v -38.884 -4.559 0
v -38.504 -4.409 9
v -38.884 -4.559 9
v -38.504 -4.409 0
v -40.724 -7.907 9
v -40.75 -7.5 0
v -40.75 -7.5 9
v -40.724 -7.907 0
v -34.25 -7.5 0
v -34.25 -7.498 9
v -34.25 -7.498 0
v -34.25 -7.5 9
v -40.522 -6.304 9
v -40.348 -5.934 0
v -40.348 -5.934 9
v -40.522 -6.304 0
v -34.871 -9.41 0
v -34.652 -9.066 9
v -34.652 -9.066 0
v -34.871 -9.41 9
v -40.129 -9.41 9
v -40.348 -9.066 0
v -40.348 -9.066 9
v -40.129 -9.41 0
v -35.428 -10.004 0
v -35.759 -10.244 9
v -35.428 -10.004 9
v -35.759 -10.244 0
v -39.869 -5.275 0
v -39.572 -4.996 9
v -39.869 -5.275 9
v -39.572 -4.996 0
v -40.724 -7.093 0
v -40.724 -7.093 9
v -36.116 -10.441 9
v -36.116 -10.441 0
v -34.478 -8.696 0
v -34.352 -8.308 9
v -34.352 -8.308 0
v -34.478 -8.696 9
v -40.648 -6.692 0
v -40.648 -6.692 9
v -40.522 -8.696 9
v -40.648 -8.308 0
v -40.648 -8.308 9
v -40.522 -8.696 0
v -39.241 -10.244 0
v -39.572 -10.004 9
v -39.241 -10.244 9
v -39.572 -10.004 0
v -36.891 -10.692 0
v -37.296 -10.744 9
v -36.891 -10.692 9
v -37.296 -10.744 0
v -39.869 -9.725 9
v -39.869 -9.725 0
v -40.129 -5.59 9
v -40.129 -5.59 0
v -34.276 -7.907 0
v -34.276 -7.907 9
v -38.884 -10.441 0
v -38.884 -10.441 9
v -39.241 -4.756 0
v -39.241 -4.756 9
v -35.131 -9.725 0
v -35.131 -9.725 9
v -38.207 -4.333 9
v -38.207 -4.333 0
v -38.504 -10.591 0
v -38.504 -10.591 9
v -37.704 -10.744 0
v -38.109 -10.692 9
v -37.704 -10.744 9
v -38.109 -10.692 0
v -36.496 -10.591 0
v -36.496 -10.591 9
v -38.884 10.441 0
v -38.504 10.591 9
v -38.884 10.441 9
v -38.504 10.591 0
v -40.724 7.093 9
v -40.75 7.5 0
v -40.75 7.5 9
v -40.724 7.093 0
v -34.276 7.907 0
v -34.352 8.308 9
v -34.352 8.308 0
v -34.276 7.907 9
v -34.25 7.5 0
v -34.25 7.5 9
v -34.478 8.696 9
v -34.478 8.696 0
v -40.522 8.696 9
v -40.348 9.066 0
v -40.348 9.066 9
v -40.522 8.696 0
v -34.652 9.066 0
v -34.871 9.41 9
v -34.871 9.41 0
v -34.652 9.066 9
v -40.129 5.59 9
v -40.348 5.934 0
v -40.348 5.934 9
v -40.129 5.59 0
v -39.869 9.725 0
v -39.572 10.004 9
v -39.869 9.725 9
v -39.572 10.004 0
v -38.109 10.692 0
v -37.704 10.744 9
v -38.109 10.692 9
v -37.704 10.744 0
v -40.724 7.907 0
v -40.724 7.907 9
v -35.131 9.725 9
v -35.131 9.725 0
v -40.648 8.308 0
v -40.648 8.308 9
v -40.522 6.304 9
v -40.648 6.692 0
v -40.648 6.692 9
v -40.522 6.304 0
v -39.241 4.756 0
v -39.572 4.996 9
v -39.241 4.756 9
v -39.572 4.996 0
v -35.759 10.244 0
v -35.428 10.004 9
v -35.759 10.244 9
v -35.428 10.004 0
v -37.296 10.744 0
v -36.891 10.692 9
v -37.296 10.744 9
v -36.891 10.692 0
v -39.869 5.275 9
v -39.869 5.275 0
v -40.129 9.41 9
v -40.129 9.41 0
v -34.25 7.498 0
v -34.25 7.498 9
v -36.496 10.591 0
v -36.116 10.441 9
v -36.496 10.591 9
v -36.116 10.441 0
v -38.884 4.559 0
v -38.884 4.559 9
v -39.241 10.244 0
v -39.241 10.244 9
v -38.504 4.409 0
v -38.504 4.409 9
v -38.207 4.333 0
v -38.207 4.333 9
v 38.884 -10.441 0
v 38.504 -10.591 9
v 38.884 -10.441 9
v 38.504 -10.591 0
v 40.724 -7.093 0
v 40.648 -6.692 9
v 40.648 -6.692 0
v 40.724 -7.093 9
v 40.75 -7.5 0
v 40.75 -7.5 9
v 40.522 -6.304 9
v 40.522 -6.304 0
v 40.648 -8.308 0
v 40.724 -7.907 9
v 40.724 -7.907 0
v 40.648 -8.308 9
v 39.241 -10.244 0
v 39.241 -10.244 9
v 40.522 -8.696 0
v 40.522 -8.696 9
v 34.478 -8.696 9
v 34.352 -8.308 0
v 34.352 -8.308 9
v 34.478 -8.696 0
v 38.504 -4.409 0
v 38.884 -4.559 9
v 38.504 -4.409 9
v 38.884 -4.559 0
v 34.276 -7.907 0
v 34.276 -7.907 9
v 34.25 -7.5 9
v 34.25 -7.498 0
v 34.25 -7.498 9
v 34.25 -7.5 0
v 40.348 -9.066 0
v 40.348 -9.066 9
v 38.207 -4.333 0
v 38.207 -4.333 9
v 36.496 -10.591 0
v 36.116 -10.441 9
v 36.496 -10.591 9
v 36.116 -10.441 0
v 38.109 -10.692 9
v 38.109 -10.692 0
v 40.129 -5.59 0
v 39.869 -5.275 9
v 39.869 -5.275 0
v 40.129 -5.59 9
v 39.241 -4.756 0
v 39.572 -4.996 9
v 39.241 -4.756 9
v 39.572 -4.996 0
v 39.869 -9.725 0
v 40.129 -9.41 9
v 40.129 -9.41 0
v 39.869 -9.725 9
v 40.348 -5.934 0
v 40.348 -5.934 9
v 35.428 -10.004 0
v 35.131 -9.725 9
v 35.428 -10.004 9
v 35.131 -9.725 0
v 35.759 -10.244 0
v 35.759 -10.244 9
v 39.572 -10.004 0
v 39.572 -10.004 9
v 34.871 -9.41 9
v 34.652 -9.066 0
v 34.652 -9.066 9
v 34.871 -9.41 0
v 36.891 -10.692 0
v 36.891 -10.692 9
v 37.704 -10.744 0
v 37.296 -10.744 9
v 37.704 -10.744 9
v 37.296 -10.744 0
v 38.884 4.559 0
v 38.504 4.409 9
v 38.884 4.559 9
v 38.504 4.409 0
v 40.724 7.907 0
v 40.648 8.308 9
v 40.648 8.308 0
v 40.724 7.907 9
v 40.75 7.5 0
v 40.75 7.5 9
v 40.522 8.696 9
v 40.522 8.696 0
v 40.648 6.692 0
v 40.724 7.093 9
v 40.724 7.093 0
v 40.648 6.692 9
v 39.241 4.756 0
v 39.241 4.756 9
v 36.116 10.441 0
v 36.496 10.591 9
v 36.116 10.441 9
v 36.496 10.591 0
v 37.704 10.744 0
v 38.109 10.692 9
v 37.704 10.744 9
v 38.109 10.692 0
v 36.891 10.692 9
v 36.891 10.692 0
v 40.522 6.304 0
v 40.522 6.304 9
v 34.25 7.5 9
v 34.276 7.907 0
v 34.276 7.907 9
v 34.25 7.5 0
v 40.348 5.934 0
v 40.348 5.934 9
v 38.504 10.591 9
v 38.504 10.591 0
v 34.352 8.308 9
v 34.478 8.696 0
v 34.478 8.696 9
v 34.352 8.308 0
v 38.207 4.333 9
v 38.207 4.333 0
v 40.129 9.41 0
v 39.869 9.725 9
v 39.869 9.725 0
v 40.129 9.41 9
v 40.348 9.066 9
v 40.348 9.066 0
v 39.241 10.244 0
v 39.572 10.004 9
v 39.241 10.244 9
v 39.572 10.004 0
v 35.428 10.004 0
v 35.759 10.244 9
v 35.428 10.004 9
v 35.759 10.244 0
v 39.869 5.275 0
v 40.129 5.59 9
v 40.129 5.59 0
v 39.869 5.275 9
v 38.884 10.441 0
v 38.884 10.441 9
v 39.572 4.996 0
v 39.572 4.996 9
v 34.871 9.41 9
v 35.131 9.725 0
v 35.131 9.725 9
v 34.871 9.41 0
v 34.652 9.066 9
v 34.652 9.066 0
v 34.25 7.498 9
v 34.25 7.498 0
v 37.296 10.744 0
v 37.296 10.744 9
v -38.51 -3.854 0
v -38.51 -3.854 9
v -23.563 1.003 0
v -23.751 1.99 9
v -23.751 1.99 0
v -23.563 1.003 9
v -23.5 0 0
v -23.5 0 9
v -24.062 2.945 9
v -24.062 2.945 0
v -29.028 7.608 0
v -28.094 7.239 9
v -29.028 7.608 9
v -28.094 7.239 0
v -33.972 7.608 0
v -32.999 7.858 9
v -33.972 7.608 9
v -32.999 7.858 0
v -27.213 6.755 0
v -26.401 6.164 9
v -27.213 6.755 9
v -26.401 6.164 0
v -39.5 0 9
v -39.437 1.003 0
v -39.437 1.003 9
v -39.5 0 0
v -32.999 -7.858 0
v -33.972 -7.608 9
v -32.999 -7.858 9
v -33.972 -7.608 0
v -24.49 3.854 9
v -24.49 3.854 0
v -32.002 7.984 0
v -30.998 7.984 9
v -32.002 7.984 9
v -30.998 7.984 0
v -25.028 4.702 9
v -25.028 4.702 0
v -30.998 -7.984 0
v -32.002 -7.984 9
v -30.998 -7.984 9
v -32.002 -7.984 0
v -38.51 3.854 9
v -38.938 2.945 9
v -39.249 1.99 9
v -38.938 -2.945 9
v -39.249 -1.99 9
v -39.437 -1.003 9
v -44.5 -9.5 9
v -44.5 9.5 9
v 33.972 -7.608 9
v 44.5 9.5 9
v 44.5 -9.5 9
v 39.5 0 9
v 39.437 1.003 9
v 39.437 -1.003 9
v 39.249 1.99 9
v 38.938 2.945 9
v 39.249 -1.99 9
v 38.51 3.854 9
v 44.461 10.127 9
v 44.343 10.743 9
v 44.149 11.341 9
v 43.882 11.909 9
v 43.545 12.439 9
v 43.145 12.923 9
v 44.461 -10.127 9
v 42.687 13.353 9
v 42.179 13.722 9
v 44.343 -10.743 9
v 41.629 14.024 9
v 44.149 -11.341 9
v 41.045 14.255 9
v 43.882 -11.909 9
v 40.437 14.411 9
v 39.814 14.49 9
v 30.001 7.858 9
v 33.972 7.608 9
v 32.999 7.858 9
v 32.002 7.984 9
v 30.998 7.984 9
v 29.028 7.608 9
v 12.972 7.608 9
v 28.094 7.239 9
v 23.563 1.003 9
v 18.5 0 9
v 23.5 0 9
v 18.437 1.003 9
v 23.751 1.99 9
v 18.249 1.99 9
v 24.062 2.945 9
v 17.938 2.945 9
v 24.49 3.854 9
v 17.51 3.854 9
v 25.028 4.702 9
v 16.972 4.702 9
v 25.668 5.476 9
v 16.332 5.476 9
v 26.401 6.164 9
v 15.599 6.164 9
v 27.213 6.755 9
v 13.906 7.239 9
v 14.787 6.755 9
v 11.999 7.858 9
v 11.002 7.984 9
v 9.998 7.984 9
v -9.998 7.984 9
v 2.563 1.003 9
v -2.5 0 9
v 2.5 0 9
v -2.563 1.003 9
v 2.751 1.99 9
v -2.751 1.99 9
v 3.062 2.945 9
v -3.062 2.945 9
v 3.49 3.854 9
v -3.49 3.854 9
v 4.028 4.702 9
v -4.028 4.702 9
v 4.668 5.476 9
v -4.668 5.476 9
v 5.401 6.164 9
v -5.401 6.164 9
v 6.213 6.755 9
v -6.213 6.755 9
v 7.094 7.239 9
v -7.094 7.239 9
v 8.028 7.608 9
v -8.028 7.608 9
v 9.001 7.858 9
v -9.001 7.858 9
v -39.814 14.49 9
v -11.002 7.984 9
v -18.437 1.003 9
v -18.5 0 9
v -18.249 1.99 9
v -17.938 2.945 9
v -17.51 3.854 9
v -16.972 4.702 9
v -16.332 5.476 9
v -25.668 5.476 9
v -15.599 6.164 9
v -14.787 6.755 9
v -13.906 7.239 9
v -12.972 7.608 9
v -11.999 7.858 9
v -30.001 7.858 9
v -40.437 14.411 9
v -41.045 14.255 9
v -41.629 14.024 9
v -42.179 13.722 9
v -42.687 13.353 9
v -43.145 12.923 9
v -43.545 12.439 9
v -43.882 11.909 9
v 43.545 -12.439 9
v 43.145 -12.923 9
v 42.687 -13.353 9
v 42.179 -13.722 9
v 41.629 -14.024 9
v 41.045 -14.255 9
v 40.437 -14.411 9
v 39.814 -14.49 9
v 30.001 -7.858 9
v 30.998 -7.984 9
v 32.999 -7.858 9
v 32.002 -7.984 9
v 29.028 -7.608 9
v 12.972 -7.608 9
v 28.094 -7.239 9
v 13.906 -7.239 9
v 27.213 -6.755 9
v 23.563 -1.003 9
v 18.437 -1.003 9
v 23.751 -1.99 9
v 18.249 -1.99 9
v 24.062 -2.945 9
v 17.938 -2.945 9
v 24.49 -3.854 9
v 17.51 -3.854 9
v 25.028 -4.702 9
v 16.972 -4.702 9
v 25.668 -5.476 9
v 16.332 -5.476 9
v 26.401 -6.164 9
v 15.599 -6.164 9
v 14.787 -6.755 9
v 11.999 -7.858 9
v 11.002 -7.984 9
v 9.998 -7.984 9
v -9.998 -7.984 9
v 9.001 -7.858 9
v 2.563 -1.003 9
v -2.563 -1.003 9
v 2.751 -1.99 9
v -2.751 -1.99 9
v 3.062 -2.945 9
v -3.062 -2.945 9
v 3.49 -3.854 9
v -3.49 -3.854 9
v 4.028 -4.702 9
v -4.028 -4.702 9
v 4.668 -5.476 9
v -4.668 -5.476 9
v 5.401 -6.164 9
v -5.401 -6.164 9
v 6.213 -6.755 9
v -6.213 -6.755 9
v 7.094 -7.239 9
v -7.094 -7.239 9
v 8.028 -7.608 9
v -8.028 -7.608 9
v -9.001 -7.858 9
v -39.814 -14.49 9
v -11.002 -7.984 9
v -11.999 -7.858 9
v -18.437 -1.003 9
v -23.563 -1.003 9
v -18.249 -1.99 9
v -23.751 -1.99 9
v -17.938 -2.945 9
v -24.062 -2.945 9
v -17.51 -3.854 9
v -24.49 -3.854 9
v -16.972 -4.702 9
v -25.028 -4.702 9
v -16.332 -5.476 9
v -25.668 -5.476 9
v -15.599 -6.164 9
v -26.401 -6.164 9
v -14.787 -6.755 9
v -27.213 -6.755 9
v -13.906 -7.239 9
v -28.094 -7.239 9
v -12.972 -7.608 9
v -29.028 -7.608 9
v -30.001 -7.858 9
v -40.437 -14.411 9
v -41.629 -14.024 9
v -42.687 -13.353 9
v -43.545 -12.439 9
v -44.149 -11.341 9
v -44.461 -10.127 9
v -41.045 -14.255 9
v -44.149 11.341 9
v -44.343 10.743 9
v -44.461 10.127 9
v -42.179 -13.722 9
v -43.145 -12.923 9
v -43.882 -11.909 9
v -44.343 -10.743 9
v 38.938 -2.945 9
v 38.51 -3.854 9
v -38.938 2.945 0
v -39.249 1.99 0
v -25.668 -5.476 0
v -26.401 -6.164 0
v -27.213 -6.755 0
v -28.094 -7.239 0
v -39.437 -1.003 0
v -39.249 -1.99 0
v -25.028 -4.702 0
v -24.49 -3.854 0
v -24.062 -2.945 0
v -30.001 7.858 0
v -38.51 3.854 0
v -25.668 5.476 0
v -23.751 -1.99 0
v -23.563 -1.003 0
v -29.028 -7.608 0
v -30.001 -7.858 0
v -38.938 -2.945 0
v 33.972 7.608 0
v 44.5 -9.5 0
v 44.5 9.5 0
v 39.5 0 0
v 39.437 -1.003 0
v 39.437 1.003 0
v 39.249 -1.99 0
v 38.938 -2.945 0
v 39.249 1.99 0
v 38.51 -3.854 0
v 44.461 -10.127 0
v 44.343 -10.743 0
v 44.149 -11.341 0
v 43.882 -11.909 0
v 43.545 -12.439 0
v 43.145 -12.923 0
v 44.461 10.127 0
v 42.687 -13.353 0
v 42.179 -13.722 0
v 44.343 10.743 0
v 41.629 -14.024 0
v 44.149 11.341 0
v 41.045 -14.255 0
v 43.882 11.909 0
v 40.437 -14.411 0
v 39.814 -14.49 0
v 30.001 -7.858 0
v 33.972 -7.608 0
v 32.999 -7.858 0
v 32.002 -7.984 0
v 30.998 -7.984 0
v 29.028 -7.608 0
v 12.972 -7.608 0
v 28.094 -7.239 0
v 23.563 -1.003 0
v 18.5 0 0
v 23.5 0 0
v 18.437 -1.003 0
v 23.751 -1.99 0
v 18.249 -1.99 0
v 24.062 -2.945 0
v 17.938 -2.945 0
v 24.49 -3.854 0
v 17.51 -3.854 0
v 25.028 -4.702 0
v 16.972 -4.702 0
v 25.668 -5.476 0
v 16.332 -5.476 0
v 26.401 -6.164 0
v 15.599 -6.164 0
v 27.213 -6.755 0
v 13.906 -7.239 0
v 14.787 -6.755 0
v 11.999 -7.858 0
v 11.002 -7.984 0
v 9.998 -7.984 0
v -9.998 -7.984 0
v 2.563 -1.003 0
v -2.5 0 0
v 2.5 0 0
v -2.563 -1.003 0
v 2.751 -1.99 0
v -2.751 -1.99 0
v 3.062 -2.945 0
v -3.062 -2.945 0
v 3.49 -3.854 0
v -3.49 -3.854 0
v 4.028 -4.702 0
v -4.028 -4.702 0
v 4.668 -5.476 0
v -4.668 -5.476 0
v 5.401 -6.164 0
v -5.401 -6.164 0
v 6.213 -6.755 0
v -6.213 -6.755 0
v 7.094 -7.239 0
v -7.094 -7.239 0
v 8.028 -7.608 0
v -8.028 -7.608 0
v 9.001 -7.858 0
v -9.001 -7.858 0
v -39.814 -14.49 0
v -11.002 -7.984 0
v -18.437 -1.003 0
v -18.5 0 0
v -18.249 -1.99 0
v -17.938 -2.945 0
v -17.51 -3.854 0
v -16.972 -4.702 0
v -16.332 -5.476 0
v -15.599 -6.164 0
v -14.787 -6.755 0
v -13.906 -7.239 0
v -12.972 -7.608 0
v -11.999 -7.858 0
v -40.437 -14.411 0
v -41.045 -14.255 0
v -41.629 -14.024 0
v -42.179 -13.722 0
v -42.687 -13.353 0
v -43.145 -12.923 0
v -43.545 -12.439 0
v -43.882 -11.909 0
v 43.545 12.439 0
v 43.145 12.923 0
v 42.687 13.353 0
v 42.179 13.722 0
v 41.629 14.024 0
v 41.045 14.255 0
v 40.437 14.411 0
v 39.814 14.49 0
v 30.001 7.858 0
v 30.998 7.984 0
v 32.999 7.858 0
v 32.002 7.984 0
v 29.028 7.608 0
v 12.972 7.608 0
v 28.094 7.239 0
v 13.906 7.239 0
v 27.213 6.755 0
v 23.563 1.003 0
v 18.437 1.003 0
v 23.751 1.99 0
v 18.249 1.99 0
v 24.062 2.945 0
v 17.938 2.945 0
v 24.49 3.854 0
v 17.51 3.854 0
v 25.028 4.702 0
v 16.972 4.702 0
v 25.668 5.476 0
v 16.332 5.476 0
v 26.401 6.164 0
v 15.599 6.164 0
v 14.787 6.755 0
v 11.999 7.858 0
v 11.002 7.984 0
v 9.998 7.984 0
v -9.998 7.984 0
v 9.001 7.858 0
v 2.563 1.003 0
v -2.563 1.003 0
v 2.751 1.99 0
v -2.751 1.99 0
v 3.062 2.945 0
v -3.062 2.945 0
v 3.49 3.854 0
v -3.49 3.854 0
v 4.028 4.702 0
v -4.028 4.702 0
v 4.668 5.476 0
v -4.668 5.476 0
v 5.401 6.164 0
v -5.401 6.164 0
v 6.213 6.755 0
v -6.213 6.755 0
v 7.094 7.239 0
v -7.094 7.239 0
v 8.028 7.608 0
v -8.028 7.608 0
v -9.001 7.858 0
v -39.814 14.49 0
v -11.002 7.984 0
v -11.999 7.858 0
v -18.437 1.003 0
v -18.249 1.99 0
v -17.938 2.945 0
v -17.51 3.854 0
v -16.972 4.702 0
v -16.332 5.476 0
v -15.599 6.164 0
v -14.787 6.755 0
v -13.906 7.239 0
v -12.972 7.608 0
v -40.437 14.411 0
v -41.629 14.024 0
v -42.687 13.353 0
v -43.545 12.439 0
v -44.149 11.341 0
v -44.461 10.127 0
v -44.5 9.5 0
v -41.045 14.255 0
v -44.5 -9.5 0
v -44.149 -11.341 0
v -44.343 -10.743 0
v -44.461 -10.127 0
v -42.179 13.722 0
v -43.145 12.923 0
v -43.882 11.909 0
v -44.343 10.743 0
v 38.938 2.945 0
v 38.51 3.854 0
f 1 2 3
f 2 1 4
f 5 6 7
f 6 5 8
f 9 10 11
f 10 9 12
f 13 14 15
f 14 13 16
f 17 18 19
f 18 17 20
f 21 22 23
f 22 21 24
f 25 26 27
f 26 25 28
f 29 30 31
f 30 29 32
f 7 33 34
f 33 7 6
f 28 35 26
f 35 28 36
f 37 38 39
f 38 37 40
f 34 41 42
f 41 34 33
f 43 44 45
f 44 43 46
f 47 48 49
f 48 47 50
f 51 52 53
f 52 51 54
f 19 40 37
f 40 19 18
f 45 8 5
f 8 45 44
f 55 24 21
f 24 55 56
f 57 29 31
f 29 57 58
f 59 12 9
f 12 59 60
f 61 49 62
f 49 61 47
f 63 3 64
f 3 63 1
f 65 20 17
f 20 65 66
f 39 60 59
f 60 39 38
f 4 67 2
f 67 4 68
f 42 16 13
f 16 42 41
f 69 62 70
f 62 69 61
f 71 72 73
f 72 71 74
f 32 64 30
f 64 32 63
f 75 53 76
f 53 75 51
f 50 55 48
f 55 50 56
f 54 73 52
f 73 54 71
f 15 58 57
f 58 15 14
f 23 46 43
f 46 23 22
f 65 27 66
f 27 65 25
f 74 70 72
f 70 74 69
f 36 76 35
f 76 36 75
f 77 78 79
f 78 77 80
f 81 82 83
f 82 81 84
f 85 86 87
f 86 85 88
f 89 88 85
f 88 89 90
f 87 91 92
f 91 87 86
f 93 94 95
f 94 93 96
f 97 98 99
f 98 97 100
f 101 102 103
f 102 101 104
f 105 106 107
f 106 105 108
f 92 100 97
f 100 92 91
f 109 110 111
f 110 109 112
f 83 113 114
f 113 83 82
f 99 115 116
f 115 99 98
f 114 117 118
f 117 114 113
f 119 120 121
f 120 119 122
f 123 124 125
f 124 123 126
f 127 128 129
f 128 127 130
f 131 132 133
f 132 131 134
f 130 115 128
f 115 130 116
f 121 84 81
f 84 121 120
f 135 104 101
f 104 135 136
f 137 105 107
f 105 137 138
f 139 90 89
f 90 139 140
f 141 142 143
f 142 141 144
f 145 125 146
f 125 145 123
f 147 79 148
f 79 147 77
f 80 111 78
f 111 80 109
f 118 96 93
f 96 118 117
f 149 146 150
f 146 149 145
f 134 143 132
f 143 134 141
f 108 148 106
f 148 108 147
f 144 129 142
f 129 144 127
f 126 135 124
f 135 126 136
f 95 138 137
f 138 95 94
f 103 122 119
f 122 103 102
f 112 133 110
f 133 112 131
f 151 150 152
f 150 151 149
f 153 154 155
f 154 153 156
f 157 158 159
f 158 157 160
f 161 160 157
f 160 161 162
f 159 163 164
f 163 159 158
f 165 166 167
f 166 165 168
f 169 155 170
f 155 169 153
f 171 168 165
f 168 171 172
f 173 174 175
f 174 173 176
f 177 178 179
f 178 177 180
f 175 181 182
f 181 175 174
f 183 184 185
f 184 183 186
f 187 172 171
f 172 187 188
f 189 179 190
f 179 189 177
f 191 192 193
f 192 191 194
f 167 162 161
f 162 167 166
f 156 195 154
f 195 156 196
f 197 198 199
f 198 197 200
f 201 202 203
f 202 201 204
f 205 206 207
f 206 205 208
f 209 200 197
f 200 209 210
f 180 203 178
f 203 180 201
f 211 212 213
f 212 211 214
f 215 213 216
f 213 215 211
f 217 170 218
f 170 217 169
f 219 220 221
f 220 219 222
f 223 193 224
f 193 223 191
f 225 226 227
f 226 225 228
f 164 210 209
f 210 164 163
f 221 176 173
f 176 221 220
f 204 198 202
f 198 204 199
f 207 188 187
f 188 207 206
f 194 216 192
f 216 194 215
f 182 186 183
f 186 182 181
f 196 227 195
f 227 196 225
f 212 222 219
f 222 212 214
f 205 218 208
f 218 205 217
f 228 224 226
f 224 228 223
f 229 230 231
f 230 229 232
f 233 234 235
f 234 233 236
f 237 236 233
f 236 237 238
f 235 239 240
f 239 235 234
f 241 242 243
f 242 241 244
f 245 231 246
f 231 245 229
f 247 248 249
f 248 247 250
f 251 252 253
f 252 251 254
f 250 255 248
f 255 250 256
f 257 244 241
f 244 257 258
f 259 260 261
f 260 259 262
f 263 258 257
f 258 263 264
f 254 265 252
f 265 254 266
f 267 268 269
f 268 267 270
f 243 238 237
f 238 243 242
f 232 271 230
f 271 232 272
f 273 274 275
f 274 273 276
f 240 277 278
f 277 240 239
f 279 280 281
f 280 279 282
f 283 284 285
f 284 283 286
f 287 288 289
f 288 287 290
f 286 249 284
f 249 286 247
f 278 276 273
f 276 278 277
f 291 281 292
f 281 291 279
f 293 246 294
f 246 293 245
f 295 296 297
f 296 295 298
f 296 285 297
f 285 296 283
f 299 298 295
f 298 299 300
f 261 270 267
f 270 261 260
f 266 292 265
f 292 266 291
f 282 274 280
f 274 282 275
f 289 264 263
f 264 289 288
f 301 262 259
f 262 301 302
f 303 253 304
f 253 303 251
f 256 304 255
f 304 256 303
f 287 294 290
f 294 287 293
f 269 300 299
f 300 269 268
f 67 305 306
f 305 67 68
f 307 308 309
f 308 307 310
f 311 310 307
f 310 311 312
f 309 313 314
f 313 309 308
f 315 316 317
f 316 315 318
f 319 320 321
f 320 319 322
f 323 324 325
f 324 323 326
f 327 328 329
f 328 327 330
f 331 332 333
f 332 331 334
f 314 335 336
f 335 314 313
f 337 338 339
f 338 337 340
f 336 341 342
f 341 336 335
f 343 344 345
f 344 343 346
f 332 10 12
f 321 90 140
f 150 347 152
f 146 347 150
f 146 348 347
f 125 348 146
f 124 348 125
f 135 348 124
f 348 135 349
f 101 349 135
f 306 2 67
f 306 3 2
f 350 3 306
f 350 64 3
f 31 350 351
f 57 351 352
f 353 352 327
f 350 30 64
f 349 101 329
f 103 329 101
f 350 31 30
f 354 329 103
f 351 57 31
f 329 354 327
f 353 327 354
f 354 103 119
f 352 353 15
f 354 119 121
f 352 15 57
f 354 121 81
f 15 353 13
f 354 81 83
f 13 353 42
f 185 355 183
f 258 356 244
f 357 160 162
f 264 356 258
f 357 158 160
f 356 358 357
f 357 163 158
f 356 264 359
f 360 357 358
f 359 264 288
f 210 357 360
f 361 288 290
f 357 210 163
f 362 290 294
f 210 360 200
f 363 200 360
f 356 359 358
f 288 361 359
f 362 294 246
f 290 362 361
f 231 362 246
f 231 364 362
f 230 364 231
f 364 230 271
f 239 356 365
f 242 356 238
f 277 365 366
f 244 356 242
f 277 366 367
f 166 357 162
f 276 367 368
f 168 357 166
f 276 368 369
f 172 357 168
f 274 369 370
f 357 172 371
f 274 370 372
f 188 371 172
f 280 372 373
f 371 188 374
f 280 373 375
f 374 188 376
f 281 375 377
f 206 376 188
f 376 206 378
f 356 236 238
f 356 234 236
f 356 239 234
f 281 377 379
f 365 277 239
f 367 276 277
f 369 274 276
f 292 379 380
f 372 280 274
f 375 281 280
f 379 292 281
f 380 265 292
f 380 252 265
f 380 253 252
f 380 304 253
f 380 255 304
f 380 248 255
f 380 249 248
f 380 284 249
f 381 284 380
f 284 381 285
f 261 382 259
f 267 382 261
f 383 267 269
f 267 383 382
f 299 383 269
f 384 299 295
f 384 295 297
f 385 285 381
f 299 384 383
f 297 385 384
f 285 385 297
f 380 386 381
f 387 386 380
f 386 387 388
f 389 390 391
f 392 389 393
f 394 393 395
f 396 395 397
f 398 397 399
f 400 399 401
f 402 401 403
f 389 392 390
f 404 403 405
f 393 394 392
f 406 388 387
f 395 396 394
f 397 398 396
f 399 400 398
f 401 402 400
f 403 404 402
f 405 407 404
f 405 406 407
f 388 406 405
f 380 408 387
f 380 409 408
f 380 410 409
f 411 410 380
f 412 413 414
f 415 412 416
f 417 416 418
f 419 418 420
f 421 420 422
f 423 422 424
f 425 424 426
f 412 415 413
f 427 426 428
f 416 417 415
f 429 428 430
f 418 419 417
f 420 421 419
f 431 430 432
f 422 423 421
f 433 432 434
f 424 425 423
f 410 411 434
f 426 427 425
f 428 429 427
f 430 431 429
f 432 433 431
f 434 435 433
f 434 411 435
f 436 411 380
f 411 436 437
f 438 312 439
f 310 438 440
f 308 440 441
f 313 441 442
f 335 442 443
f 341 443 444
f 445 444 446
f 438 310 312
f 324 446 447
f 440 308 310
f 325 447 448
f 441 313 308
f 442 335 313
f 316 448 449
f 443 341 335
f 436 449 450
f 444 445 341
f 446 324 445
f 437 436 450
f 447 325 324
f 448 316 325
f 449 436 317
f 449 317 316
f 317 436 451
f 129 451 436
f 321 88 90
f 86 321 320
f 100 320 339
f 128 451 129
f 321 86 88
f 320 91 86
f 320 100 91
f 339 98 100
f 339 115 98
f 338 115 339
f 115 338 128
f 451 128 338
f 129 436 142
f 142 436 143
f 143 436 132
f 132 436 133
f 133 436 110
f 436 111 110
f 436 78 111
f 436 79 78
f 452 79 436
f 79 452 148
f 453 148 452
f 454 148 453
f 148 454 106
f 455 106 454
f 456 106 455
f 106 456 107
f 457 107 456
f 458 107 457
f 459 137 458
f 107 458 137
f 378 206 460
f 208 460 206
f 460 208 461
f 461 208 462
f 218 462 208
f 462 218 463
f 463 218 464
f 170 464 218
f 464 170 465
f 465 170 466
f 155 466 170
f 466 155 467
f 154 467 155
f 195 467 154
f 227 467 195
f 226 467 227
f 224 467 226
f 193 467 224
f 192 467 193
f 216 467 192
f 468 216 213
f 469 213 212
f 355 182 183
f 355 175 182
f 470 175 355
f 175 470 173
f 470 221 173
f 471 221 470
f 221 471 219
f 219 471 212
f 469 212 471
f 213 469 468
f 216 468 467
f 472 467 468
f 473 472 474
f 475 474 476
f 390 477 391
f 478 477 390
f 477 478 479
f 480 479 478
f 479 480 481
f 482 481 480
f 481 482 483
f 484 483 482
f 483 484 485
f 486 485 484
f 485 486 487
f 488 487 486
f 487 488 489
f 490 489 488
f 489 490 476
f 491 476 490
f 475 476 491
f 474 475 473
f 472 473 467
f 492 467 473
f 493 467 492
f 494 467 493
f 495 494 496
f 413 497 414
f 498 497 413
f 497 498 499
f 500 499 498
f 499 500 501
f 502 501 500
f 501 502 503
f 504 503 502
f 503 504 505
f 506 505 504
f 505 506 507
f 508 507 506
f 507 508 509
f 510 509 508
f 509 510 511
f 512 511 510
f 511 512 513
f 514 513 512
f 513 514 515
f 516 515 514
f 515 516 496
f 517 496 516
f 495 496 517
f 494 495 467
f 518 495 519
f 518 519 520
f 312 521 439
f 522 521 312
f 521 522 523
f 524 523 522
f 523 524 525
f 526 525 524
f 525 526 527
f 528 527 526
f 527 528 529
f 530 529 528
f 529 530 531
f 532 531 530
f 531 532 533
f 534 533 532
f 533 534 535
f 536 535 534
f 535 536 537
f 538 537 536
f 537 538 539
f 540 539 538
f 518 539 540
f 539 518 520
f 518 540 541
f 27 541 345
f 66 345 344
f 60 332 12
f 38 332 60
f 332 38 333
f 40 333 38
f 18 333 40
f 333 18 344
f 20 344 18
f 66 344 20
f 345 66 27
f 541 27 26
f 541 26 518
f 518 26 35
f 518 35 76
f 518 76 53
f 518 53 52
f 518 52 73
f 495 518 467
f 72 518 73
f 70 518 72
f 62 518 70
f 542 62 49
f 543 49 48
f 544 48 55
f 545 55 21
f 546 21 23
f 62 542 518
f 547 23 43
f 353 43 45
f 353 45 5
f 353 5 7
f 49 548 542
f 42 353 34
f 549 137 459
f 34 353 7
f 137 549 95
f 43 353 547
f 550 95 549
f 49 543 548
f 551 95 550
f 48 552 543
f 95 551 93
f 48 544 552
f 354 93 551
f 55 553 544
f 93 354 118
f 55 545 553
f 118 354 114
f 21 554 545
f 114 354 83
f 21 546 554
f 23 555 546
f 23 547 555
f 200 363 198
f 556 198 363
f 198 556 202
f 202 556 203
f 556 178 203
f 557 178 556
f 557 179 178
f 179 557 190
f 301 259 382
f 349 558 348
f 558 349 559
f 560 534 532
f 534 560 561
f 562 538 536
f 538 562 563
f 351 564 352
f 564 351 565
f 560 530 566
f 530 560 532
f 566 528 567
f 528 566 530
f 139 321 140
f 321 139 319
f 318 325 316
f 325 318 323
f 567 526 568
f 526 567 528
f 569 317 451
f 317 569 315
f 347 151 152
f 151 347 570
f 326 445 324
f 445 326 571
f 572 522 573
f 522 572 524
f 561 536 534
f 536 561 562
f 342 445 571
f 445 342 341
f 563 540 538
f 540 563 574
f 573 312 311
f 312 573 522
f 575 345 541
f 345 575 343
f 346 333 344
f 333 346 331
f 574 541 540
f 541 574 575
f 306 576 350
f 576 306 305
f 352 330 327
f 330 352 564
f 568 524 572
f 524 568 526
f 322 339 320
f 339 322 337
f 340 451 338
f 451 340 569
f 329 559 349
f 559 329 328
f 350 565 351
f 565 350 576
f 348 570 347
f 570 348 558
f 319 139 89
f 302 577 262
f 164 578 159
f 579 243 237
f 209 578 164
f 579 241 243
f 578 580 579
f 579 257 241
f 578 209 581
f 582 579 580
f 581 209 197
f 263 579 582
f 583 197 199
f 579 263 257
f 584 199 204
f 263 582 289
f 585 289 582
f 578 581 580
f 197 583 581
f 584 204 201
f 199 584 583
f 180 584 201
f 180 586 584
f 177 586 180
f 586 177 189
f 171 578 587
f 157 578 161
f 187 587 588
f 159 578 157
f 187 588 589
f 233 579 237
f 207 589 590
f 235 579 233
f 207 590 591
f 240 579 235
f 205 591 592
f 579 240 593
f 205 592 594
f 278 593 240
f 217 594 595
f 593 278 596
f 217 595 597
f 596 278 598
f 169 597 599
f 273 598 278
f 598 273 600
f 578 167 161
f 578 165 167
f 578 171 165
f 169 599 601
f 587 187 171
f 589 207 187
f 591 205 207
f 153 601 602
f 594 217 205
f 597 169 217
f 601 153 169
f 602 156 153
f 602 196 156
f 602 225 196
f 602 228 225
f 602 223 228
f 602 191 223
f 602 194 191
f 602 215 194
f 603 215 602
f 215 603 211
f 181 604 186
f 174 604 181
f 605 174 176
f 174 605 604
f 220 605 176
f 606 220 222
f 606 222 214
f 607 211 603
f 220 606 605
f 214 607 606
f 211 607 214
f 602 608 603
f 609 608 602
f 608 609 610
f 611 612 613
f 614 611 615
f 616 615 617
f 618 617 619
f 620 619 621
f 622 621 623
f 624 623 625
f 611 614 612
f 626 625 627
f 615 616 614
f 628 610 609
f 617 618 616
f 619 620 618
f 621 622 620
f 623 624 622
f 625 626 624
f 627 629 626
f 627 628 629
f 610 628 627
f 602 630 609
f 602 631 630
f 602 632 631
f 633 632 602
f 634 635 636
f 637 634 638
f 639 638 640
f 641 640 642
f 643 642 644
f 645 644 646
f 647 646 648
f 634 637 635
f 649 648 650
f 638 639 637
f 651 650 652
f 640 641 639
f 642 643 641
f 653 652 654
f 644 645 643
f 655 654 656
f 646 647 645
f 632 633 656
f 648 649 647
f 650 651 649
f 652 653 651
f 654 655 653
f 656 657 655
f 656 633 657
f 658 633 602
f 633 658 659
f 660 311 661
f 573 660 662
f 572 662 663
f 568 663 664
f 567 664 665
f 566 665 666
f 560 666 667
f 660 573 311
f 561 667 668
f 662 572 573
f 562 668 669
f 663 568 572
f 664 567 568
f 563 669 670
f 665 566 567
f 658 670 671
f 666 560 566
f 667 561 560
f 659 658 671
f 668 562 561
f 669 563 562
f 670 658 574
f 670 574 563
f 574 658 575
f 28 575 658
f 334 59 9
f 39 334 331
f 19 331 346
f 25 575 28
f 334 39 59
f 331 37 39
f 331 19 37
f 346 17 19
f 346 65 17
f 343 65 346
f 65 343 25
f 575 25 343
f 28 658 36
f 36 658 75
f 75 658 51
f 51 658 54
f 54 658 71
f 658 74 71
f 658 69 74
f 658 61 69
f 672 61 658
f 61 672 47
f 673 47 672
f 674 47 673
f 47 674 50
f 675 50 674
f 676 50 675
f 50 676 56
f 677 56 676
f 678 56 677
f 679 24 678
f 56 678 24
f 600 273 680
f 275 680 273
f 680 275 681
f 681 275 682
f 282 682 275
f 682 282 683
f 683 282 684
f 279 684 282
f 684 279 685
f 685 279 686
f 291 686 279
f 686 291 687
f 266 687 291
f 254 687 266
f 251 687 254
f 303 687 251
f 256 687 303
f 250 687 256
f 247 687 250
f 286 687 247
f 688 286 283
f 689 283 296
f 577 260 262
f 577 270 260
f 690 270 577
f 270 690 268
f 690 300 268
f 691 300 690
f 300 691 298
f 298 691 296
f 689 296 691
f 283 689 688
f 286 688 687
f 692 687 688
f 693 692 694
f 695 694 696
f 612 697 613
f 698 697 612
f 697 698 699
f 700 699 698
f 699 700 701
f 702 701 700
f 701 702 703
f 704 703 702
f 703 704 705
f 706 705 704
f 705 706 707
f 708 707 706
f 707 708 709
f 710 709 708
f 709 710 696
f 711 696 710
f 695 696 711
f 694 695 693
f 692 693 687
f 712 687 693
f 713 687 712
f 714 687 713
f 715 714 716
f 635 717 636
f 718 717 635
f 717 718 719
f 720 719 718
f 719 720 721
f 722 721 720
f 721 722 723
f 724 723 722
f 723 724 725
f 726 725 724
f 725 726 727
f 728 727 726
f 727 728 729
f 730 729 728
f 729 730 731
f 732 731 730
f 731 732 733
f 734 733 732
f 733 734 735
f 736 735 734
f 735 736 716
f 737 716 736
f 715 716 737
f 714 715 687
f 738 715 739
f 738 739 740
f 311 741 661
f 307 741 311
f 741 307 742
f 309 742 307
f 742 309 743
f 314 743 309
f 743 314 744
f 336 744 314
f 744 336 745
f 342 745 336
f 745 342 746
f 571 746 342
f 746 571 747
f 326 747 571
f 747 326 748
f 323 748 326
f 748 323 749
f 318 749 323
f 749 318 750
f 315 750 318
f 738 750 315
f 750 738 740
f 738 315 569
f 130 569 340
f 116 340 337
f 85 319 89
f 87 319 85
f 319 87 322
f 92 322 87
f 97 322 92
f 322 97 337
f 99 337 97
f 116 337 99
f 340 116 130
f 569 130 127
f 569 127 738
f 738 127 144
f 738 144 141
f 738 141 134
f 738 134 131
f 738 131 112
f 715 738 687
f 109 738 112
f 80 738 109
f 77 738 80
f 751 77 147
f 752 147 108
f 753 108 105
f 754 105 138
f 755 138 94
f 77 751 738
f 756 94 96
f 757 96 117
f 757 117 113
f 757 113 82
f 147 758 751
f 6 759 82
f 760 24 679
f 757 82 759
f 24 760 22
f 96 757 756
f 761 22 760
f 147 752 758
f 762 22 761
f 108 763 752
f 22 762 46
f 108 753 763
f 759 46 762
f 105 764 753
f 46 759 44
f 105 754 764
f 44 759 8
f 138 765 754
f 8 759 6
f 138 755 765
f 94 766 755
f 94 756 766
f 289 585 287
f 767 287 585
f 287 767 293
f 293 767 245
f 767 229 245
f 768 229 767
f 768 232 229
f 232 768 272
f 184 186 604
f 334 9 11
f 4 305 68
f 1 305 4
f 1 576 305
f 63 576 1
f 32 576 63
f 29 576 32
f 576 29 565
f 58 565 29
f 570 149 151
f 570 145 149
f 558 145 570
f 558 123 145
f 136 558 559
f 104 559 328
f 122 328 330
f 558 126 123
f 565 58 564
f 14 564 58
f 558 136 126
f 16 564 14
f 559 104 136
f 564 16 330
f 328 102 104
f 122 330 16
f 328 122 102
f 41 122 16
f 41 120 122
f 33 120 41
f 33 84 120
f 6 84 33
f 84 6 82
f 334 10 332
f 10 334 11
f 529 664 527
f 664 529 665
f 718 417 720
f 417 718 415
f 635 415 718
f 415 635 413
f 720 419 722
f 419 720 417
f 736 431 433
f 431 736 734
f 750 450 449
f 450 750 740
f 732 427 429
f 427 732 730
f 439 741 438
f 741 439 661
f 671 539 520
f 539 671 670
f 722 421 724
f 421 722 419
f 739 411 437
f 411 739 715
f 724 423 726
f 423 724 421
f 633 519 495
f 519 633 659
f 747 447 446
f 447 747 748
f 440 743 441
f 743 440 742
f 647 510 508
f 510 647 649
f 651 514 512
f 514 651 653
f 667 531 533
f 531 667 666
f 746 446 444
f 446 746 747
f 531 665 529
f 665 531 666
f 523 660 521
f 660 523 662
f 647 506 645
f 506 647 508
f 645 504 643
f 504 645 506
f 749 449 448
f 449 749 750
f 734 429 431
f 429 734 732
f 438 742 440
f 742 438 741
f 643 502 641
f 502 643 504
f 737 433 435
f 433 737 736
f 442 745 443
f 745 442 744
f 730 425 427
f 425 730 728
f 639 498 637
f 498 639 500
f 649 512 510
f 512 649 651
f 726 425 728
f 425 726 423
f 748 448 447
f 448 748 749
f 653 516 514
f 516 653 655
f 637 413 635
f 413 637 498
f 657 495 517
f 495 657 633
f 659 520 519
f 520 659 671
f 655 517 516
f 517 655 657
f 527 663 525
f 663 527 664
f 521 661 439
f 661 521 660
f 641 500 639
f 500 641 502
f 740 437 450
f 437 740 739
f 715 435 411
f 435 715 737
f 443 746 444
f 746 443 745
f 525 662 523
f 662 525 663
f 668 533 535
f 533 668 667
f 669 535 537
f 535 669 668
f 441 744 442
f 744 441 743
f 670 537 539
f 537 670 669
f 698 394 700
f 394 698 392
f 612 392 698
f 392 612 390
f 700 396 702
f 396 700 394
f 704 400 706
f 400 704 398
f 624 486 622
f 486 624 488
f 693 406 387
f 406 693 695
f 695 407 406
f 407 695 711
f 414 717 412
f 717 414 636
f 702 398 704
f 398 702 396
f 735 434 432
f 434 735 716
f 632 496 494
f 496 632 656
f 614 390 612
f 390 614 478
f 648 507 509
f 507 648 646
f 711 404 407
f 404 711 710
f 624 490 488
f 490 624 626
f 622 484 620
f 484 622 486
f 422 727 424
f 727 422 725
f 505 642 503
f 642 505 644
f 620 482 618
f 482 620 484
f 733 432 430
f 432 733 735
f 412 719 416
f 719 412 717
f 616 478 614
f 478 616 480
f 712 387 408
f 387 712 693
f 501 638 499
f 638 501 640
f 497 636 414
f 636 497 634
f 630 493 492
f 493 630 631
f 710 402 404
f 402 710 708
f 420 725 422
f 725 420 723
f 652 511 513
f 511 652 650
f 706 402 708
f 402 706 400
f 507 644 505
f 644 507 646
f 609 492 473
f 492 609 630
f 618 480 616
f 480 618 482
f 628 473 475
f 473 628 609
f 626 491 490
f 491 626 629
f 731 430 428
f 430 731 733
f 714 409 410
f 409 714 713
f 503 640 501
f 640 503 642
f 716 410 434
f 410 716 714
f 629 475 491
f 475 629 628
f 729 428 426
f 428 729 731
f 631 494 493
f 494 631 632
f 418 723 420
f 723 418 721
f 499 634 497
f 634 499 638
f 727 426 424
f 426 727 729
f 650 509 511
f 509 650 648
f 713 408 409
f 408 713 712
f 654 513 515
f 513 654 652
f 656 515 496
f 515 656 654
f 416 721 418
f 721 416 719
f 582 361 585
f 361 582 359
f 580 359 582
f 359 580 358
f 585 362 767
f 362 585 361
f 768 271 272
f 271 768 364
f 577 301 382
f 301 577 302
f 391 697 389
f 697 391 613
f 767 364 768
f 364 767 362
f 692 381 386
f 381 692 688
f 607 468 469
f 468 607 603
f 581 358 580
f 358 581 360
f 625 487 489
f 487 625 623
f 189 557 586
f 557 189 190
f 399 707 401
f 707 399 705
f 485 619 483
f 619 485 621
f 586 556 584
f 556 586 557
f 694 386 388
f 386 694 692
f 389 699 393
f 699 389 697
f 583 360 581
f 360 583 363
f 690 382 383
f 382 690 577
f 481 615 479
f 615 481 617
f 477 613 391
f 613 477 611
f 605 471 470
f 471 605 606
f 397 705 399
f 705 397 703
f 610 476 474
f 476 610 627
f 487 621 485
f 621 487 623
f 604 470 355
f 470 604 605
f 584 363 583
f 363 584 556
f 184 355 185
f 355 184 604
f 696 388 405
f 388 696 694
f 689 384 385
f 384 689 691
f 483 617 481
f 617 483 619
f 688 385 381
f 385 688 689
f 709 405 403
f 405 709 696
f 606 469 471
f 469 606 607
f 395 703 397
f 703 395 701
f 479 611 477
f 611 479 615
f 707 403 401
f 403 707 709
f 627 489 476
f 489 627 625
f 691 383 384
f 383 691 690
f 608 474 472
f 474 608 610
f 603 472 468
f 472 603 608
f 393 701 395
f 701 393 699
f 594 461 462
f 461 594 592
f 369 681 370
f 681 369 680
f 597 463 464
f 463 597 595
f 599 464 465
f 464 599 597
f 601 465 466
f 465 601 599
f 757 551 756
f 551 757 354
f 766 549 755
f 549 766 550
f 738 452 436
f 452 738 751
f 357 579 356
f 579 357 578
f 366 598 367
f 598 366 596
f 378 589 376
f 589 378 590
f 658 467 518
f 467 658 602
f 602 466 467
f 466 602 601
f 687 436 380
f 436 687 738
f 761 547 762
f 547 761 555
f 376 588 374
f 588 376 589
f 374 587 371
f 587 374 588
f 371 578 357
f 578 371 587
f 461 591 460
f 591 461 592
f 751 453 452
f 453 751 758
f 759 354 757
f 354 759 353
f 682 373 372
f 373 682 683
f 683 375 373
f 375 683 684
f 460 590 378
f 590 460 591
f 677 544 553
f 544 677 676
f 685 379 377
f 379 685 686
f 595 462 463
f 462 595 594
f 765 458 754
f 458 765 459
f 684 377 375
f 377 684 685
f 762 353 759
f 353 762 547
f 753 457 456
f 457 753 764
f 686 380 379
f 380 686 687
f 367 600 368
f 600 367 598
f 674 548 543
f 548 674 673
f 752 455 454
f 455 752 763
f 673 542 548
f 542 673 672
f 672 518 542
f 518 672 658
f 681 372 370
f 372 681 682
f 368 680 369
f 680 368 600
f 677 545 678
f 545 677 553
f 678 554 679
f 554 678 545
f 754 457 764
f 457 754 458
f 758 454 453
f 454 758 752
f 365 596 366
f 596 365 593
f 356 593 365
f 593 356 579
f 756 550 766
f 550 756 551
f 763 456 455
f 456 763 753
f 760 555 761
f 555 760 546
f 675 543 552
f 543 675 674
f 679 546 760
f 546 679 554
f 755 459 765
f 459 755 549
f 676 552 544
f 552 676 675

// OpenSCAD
$fn = 50;


difference() {
	union() {
		hull() {
			translate(v = [-39.5000000000, 9.5000000000, 0]) {
				cylinder(h = 9, r = 5);
			}
			translate(v = [39.5000000000, 9.5000000000, 0]) {
				cylinder(h = 9, r = 5);
			}
			translate(v = [-39.5000000000, -9.5000000000, 0]) {
				cylinder(h = 9, r = 5);
			}
			translate(v = [39.5000000000, -9.5000000000, 0]) {
				cylinder(h = 9, r = 5);
			}
		}
	}
	union() {
		#translate(v = [-37.5000000000, -7.5000000000, -100.0000000000]) {
			cylinder(h = 200, r = 3.2500000000);
		}
		#translate(v = [-37.5000000000, 7.5000000000, -100.0000000000]) {
			cylinder(h = 200, r = 3.2500000000);
		}
		#translate(v = [37.5000000000, -7.5000000000, -100.0000000000]) {
			cylinder(h = 200, r = 3.2500000000);
		}
		#translate(v = [37.5000000000, 7.5000000000, -100.0000000000]) {
			cylinder(h = 200, r = 3.2500000000);
		}
		#translate(v = [-31.5000000000, 0, 0]) {
			cylinder(h = 9, r = 8.0000000000);
		}
		#translate(v = [-10.5000000000, 0, 0]) {
			cylinder(h = 9, r = 8.0000000000);
		}
		#translate(v = [10.5000000000, 0, 0]) {
			cylinder(h = 9, r = 8.0000000000);
		}
		#translate(v = [31.5000000000, 0, 0]) {
			cylinder(h = 9, r = 8.0000000000);
		}
	}
}
